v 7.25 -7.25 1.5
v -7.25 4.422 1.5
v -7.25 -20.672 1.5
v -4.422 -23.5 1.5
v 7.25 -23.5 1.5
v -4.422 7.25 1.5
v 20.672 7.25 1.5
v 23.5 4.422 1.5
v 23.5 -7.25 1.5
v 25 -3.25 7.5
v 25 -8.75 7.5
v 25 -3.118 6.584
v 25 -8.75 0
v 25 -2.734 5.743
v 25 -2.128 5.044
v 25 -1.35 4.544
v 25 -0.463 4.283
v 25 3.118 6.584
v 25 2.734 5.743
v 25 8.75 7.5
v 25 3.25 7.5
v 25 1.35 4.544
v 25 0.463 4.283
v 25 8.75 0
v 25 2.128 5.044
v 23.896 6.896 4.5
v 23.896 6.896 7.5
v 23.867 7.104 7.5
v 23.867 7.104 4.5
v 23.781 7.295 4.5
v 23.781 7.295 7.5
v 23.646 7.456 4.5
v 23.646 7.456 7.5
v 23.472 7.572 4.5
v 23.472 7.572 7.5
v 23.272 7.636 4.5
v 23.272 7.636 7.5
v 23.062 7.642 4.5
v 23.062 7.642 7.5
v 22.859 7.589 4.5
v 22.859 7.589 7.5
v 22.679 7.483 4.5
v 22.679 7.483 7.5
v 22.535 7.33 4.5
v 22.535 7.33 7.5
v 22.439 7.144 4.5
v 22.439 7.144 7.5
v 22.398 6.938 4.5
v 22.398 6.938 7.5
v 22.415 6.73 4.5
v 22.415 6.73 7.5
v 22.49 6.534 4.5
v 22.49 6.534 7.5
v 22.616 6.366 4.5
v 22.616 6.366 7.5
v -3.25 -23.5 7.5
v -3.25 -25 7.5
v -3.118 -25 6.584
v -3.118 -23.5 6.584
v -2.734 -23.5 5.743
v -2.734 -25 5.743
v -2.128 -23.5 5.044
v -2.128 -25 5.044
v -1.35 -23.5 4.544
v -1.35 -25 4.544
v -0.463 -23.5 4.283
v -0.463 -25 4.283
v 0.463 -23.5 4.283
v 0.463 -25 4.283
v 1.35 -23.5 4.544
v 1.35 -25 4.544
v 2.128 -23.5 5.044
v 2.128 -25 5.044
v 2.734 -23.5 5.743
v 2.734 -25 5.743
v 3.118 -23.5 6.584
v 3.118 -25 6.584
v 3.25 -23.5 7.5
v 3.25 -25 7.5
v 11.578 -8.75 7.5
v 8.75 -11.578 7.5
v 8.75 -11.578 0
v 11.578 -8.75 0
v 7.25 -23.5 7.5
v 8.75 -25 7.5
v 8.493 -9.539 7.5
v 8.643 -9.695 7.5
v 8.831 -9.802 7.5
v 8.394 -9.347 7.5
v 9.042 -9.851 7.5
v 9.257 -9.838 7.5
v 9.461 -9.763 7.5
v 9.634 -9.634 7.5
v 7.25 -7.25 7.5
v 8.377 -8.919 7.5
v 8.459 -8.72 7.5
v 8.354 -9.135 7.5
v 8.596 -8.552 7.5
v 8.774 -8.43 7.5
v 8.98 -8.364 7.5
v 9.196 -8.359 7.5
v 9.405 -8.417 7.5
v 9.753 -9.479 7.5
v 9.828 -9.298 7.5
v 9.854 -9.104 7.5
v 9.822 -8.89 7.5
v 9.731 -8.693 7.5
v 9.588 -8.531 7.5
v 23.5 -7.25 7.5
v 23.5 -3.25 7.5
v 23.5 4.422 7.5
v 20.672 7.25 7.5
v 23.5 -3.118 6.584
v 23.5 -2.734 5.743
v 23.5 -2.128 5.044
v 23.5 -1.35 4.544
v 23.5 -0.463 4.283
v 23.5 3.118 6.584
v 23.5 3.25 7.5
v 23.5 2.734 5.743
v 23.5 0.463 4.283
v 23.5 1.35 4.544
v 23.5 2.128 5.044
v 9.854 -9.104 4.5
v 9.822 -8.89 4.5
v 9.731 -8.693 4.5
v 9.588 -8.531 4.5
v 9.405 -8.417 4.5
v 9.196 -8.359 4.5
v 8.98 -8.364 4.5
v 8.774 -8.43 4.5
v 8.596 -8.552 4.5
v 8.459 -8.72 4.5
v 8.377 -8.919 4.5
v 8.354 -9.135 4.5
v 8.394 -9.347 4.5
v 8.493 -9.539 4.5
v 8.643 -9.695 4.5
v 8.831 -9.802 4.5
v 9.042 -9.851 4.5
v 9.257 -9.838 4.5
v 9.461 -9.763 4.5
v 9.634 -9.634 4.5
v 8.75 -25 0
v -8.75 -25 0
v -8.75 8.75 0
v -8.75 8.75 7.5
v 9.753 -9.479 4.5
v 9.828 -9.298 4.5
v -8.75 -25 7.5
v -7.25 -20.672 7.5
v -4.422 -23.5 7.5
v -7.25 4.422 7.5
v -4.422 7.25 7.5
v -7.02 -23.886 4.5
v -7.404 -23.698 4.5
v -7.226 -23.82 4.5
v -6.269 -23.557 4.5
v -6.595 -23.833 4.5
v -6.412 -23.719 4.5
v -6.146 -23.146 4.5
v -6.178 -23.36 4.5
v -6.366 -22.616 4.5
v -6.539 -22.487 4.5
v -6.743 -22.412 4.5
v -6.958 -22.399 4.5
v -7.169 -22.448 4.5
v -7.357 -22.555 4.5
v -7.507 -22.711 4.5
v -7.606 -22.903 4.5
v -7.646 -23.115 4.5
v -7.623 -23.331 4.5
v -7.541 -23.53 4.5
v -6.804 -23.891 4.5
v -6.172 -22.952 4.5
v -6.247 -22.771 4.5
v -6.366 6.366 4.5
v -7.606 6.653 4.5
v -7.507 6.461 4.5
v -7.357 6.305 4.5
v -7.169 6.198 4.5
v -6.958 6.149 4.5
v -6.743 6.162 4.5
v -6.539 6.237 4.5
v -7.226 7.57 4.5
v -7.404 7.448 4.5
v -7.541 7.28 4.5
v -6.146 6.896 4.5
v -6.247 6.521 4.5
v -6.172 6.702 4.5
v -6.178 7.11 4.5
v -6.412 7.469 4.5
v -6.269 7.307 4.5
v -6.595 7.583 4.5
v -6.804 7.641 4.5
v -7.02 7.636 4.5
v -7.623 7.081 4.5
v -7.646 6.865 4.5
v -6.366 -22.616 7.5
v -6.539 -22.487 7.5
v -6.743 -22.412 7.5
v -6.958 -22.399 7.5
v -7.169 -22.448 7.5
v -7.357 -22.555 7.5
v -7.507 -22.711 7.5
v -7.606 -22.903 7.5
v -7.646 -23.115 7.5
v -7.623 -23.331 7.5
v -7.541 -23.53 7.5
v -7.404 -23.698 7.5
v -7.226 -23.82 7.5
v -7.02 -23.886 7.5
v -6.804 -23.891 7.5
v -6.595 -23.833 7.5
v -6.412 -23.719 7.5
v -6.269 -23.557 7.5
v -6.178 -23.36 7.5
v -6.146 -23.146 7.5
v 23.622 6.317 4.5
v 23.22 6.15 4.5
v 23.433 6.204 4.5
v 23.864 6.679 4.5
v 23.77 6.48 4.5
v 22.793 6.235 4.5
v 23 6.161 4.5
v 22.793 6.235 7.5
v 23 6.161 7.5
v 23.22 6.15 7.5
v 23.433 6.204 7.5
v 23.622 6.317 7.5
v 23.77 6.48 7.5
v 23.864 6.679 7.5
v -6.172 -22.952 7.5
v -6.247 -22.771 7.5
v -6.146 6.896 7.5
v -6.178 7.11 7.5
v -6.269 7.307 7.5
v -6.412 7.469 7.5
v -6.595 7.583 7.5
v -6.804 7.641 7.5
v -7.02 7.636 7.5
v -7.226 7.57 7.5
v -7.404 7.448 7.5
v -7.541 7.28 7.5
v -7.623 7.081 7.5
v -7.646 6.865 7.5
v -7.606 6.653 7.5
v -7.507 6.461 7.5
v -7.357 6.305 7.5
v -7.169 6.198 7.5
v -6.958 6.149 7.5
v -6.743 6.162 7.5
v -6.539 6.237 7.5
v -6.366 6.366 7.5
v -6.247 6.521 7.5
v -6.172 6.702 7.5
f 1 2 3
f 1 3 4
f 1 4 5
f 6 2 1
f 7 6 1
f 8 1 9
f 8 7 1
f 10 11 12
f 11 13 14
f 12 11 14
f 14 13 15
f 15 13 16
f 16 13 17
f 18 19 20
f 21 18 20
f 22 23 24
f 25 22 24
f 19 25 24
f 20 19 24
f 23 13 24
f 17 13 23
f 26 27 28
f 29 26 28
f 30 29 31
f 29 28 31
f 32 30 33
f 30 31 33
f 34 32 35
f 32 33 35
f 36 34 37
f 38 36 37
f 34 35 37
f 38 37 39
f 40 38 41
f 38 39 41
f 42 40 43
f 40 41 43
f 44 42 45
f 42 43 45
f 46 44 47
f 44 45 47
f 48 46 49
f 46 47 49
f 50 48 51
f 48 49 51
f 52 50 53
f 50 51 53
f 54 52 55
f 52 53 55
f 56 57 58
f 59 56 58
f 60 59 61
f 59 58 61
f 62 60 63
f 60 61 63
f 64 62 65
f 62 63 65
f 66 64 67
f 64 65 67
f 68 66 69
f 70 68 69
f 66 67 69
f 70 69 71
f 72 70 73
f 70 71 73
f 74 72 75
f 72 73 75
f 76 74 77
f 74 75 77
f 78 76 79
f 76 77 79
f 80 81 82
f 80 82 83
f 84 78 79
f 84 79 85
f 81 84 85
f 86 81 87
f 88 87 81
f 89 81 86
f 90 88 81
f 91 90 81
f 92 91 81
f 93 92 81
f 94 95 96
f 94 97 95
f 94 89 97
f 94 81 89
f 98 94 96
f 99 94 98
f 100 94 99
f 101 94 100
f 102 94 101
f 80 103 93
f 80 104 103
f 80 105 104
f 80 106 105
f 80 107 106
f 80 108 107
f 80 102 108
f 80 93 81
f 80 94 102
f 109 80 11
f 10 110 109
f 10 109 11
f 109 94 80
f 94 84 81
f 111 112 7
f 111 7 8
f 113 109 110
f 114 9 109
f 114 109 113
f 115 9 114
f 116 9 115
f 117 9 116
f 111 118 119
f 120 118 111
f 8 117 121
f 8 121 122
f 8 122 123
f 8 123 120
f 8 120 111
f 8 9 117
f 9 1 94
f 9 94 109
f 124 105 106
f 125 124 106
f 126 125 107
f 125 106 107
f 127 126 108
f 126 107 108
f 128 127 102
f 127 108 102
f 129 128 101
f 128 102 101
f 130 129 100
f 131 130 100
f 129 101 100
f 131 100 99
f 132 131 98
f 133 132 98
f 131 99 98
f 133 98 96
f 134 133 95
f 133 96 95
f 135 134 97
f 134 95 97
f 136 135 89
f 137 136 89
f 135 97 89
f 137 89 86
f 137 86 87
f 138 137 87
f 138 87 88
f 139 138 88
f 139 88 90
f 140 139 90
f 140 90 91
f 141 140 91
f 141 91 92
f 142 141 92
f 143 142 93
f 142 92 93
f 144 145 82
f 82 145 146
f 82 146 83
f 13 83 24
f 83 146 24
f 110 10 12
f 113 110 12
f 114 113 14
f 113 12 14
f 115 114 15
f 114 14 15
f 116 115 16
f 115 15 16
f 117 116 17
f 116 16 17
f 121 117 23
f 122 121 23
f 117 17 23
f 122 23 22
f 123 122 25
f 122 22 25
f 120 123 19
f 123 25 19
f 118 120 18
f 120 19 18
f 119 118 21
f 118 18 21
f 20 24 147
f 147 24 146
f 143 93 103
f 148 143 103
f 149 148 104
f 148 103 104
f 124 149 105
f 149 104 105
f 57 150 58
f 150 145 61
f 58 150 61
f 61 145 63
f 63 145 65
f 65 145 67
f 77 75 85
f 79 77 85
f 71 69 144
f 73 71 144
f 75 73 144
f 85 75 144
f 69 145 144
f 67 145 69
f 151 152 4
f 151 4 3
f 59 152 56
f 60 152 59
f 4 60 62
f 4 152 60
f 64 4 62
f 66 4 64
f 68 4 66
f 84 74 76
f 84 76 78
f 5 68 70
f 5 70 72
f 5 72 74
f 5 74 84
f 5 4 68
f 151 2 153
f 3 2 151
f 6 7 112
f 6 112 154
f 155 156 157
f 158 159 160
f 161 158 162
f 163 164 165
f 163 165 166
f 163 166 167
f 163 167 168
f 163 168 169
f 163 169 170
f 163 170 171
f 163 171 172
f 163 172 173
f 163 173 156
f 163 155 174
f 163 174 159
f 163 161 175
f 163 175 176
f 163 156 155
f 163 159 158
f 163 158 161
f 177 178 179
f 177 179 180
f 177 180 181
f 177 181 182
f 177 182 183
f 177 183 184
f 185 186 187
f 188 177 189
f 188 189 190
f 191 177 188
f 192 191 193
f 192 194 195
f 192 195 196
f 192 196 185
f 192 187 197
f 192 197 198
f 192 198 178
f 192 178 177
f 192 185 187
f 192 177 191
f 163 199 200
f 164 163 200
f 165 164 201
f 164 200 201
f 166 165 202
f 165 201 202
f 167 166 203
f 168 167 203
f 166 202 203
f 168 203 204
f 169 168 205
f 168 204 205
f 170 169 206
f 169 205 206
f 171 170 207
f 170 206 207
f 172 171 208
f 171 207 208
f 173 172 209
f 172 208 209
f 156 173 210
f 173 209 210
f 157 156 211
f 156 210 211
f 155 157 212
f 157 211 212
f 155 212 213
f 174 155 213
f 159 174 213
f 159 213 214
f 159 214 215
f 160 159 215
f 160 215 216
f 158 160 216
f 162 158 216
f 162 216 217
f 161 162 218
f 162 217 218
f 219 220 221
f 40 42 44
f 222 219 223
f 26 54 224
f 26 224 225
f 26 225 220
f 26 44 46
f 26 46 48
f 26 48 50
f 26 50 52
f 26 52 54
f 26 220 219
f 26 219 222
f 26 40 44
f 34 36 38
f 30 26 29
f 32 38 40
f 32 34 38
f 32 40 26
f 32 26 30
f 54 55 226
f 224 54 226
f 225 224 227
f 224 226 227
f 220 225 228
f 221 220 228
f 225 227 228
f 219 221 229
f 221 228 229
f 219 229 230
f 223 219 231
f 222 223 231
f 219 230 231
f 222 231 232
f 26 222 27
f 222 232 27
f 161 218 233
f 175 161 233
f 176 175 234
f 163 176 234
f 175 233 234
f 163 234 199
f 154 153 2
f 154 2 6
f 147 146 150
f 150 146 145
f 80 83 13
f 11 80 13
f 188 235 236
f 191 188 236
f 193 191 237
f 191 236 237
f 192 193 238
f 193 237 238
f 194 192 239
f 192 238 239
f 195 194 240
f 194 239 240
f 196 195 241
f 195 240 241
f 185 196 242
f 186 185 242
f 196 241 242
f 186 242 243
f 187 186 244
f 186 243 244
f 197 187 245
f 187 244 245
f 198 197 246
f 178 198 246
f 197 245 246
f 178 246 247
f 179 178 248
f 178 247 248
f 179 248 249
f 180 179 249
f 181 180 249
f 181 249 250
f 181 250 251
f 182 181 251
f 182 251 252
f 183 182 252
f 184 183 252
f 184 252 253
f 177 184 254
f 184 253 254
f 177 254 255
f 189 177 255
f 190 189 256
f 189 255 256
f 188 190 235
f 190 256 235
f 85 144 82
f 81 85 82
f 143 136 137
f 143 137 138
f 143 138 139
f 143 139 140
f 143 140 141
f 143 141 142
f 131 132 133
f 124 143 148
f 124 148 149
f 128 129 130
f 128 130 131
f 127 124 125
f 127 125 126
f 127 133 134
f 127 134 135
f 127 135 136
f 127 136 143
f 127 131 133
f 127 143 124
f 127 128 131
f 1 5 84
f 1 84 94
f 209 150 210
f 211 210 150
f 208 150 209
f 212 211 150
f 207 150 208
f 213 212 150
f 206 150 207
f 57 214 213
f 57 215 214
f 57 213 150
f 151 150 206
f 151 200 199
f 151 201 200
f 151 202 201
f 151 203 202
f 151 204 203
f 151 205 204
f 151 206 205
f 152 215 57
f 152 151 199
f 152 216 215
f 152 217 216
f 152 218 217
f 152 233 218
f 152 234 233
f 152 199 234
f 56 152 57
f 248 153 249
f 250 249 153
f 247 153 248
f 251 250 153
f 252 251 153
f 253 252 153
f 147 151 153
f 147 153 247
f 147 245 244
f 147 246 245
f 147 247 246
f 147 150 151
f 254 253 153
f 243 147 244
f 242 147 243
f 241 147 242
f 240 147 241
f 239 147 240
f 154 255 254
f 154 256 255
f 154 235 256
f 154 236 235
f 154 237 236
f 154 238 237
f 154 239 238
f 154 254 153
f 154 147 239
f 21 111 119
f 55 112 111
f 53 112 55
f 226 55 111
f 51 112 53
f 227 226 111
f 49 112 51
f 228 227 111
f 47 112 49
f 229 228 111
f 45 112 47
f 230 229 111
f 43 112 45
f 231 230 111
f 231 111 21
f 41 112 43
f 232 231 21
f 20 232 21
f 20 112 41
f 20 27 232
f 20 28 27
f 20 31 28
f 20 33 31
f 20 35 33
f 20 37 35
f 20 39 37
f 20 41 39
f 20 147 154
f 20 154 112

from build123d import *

# Parameters (mm, degrees)
F0_W      = 8.75
F0_H      = 8.75
F1_DEPTH  = 7.5
F2_T      = -1.5
F4_DEPTH  = 7.5
F6_DEPTH  = 3
F7_R      = 3.25
F8_DEPTH  = 32.25
F9_R      = 3.25
F10_DEPTH = 32.25


with BuildPart() as f1:
    # F0 (on Top) → F1 (new body)
    with BuildSketch(Plane.XY):
        Polygon((25, 0), (25, 8.75), (8.75, 8.75), (0, 8.75), (0, 0), align=None)
        Polygon((25, -8.75), (25, 0), (0, 0), (0, -25), (8.75, -25), (8.75, -8.75), align=None)
        with Locations((-4.375, 4.375)):
            Rectangle(F0_W, F0_H)
        Polygon((0, -25), (0, 0), (-8.75, 0), (-8.75, -8.75), (-8.75, -25), align=None)
    extrude(amount=F1_DEPTH)

    # F2
    f2_openings = [f1.faces().sort_by_distance(p)[0] for p in [
        (5.484375, -5.484375, 7.5),
    ]]
    offset(amount=F2_T, openings=f2_openings, kind=Kind.INTERSECTION)

    # F3 (on face) → F4 (join, through all)
    with BuildSketch(Plane.XY.offset(7.5)):
        Polygon((-4.4215728753, 7.25), (-7.25, 7.25), (-7.25, 4.4215728753), align=None)
        Polygon((11.5784271247, -8.75), (8.75, -8.75), (8.75, -11.5784271247), align=None)
        Polygon((23.5, 7.25), (20.6715728753, 7.25), (23.5, 4.4215728753), align=None)
        Polygon((-4.4215728753, -23.5), (-7.25, -20.6715728753), (-7.25, -23.5), align=None)
    extrude(amount=-F4_DEPTH)

    # F5 (on face) → F6 (cut)
    with BuildSketch(Plane.XY.offset(7.5)):
        with BuildLine():
            ThreePointArc((-6.3661165235, 6.3661165235), (-6.20353696, 6.6094340351), (-6.1464466094, 6.8964466094))
            ThreePointArc((-6.1464466094, 6.8964466094), (-7.5893562588, 7.1834591837), (-6.3661165235, 6.3661165235))
        make_face()
        with BuildLine():
            ThreePointArc((22.6161165235, 6.3661165235), (23.4334591837, 6.20353696), (23.8964466094, 6.8964466094))
            ThreePointArc((23.8964466094, 6.8964466094), (22.8594340351, 7.5893562588), (22.6161165235, 6.3661165235))
        make_face()
        with BuildLine():
            ThreePointArc((9.6338834765, -9.6338834765), (9.79646304, -9.3905659649), (9.8535533906, -9.1035533906))
            ThreePointArc((9.8535533906, -9.1035533906), (8.4106437412, -8.8165408163), (9.6338834765, -9.6338834765))
        make_face()
        with BuildLine():
            ThreePointArc((-6.3661165235, -22.6161165235), (-7.5893562588, -23.4334591837), (-6.1464466094, -23.1464466094))
            ThreePointArc((-6.1464466094, -23.1464466094), (-6.20353696, -22.8594340351), (-6.3661165235, -22.6161165235))
        make_face()
    extrude(amount=-F6_DEPTH, mode=Mode.SUBTRACT)

    # F7 (on face) → F8 (cut, through all)
    with BuildSketch(Plane.XZ.offset(25)):
        with Locations((0, 7.5)):
            Circle(F7_R)
    extrude(amount=-F8_DEPTH, mode=Mode.SUBTRACT)

    # F9 (on face) → F10 (cut, through all)
    with BuildSketch(Plane.YZ.offset(25)):
        with Locations((0, 7.5)):
            Circle(F9_R)
    extrude(amount=-F10_DEPTH, mode=Mode.SUBTRACT)


solid = f1.part
